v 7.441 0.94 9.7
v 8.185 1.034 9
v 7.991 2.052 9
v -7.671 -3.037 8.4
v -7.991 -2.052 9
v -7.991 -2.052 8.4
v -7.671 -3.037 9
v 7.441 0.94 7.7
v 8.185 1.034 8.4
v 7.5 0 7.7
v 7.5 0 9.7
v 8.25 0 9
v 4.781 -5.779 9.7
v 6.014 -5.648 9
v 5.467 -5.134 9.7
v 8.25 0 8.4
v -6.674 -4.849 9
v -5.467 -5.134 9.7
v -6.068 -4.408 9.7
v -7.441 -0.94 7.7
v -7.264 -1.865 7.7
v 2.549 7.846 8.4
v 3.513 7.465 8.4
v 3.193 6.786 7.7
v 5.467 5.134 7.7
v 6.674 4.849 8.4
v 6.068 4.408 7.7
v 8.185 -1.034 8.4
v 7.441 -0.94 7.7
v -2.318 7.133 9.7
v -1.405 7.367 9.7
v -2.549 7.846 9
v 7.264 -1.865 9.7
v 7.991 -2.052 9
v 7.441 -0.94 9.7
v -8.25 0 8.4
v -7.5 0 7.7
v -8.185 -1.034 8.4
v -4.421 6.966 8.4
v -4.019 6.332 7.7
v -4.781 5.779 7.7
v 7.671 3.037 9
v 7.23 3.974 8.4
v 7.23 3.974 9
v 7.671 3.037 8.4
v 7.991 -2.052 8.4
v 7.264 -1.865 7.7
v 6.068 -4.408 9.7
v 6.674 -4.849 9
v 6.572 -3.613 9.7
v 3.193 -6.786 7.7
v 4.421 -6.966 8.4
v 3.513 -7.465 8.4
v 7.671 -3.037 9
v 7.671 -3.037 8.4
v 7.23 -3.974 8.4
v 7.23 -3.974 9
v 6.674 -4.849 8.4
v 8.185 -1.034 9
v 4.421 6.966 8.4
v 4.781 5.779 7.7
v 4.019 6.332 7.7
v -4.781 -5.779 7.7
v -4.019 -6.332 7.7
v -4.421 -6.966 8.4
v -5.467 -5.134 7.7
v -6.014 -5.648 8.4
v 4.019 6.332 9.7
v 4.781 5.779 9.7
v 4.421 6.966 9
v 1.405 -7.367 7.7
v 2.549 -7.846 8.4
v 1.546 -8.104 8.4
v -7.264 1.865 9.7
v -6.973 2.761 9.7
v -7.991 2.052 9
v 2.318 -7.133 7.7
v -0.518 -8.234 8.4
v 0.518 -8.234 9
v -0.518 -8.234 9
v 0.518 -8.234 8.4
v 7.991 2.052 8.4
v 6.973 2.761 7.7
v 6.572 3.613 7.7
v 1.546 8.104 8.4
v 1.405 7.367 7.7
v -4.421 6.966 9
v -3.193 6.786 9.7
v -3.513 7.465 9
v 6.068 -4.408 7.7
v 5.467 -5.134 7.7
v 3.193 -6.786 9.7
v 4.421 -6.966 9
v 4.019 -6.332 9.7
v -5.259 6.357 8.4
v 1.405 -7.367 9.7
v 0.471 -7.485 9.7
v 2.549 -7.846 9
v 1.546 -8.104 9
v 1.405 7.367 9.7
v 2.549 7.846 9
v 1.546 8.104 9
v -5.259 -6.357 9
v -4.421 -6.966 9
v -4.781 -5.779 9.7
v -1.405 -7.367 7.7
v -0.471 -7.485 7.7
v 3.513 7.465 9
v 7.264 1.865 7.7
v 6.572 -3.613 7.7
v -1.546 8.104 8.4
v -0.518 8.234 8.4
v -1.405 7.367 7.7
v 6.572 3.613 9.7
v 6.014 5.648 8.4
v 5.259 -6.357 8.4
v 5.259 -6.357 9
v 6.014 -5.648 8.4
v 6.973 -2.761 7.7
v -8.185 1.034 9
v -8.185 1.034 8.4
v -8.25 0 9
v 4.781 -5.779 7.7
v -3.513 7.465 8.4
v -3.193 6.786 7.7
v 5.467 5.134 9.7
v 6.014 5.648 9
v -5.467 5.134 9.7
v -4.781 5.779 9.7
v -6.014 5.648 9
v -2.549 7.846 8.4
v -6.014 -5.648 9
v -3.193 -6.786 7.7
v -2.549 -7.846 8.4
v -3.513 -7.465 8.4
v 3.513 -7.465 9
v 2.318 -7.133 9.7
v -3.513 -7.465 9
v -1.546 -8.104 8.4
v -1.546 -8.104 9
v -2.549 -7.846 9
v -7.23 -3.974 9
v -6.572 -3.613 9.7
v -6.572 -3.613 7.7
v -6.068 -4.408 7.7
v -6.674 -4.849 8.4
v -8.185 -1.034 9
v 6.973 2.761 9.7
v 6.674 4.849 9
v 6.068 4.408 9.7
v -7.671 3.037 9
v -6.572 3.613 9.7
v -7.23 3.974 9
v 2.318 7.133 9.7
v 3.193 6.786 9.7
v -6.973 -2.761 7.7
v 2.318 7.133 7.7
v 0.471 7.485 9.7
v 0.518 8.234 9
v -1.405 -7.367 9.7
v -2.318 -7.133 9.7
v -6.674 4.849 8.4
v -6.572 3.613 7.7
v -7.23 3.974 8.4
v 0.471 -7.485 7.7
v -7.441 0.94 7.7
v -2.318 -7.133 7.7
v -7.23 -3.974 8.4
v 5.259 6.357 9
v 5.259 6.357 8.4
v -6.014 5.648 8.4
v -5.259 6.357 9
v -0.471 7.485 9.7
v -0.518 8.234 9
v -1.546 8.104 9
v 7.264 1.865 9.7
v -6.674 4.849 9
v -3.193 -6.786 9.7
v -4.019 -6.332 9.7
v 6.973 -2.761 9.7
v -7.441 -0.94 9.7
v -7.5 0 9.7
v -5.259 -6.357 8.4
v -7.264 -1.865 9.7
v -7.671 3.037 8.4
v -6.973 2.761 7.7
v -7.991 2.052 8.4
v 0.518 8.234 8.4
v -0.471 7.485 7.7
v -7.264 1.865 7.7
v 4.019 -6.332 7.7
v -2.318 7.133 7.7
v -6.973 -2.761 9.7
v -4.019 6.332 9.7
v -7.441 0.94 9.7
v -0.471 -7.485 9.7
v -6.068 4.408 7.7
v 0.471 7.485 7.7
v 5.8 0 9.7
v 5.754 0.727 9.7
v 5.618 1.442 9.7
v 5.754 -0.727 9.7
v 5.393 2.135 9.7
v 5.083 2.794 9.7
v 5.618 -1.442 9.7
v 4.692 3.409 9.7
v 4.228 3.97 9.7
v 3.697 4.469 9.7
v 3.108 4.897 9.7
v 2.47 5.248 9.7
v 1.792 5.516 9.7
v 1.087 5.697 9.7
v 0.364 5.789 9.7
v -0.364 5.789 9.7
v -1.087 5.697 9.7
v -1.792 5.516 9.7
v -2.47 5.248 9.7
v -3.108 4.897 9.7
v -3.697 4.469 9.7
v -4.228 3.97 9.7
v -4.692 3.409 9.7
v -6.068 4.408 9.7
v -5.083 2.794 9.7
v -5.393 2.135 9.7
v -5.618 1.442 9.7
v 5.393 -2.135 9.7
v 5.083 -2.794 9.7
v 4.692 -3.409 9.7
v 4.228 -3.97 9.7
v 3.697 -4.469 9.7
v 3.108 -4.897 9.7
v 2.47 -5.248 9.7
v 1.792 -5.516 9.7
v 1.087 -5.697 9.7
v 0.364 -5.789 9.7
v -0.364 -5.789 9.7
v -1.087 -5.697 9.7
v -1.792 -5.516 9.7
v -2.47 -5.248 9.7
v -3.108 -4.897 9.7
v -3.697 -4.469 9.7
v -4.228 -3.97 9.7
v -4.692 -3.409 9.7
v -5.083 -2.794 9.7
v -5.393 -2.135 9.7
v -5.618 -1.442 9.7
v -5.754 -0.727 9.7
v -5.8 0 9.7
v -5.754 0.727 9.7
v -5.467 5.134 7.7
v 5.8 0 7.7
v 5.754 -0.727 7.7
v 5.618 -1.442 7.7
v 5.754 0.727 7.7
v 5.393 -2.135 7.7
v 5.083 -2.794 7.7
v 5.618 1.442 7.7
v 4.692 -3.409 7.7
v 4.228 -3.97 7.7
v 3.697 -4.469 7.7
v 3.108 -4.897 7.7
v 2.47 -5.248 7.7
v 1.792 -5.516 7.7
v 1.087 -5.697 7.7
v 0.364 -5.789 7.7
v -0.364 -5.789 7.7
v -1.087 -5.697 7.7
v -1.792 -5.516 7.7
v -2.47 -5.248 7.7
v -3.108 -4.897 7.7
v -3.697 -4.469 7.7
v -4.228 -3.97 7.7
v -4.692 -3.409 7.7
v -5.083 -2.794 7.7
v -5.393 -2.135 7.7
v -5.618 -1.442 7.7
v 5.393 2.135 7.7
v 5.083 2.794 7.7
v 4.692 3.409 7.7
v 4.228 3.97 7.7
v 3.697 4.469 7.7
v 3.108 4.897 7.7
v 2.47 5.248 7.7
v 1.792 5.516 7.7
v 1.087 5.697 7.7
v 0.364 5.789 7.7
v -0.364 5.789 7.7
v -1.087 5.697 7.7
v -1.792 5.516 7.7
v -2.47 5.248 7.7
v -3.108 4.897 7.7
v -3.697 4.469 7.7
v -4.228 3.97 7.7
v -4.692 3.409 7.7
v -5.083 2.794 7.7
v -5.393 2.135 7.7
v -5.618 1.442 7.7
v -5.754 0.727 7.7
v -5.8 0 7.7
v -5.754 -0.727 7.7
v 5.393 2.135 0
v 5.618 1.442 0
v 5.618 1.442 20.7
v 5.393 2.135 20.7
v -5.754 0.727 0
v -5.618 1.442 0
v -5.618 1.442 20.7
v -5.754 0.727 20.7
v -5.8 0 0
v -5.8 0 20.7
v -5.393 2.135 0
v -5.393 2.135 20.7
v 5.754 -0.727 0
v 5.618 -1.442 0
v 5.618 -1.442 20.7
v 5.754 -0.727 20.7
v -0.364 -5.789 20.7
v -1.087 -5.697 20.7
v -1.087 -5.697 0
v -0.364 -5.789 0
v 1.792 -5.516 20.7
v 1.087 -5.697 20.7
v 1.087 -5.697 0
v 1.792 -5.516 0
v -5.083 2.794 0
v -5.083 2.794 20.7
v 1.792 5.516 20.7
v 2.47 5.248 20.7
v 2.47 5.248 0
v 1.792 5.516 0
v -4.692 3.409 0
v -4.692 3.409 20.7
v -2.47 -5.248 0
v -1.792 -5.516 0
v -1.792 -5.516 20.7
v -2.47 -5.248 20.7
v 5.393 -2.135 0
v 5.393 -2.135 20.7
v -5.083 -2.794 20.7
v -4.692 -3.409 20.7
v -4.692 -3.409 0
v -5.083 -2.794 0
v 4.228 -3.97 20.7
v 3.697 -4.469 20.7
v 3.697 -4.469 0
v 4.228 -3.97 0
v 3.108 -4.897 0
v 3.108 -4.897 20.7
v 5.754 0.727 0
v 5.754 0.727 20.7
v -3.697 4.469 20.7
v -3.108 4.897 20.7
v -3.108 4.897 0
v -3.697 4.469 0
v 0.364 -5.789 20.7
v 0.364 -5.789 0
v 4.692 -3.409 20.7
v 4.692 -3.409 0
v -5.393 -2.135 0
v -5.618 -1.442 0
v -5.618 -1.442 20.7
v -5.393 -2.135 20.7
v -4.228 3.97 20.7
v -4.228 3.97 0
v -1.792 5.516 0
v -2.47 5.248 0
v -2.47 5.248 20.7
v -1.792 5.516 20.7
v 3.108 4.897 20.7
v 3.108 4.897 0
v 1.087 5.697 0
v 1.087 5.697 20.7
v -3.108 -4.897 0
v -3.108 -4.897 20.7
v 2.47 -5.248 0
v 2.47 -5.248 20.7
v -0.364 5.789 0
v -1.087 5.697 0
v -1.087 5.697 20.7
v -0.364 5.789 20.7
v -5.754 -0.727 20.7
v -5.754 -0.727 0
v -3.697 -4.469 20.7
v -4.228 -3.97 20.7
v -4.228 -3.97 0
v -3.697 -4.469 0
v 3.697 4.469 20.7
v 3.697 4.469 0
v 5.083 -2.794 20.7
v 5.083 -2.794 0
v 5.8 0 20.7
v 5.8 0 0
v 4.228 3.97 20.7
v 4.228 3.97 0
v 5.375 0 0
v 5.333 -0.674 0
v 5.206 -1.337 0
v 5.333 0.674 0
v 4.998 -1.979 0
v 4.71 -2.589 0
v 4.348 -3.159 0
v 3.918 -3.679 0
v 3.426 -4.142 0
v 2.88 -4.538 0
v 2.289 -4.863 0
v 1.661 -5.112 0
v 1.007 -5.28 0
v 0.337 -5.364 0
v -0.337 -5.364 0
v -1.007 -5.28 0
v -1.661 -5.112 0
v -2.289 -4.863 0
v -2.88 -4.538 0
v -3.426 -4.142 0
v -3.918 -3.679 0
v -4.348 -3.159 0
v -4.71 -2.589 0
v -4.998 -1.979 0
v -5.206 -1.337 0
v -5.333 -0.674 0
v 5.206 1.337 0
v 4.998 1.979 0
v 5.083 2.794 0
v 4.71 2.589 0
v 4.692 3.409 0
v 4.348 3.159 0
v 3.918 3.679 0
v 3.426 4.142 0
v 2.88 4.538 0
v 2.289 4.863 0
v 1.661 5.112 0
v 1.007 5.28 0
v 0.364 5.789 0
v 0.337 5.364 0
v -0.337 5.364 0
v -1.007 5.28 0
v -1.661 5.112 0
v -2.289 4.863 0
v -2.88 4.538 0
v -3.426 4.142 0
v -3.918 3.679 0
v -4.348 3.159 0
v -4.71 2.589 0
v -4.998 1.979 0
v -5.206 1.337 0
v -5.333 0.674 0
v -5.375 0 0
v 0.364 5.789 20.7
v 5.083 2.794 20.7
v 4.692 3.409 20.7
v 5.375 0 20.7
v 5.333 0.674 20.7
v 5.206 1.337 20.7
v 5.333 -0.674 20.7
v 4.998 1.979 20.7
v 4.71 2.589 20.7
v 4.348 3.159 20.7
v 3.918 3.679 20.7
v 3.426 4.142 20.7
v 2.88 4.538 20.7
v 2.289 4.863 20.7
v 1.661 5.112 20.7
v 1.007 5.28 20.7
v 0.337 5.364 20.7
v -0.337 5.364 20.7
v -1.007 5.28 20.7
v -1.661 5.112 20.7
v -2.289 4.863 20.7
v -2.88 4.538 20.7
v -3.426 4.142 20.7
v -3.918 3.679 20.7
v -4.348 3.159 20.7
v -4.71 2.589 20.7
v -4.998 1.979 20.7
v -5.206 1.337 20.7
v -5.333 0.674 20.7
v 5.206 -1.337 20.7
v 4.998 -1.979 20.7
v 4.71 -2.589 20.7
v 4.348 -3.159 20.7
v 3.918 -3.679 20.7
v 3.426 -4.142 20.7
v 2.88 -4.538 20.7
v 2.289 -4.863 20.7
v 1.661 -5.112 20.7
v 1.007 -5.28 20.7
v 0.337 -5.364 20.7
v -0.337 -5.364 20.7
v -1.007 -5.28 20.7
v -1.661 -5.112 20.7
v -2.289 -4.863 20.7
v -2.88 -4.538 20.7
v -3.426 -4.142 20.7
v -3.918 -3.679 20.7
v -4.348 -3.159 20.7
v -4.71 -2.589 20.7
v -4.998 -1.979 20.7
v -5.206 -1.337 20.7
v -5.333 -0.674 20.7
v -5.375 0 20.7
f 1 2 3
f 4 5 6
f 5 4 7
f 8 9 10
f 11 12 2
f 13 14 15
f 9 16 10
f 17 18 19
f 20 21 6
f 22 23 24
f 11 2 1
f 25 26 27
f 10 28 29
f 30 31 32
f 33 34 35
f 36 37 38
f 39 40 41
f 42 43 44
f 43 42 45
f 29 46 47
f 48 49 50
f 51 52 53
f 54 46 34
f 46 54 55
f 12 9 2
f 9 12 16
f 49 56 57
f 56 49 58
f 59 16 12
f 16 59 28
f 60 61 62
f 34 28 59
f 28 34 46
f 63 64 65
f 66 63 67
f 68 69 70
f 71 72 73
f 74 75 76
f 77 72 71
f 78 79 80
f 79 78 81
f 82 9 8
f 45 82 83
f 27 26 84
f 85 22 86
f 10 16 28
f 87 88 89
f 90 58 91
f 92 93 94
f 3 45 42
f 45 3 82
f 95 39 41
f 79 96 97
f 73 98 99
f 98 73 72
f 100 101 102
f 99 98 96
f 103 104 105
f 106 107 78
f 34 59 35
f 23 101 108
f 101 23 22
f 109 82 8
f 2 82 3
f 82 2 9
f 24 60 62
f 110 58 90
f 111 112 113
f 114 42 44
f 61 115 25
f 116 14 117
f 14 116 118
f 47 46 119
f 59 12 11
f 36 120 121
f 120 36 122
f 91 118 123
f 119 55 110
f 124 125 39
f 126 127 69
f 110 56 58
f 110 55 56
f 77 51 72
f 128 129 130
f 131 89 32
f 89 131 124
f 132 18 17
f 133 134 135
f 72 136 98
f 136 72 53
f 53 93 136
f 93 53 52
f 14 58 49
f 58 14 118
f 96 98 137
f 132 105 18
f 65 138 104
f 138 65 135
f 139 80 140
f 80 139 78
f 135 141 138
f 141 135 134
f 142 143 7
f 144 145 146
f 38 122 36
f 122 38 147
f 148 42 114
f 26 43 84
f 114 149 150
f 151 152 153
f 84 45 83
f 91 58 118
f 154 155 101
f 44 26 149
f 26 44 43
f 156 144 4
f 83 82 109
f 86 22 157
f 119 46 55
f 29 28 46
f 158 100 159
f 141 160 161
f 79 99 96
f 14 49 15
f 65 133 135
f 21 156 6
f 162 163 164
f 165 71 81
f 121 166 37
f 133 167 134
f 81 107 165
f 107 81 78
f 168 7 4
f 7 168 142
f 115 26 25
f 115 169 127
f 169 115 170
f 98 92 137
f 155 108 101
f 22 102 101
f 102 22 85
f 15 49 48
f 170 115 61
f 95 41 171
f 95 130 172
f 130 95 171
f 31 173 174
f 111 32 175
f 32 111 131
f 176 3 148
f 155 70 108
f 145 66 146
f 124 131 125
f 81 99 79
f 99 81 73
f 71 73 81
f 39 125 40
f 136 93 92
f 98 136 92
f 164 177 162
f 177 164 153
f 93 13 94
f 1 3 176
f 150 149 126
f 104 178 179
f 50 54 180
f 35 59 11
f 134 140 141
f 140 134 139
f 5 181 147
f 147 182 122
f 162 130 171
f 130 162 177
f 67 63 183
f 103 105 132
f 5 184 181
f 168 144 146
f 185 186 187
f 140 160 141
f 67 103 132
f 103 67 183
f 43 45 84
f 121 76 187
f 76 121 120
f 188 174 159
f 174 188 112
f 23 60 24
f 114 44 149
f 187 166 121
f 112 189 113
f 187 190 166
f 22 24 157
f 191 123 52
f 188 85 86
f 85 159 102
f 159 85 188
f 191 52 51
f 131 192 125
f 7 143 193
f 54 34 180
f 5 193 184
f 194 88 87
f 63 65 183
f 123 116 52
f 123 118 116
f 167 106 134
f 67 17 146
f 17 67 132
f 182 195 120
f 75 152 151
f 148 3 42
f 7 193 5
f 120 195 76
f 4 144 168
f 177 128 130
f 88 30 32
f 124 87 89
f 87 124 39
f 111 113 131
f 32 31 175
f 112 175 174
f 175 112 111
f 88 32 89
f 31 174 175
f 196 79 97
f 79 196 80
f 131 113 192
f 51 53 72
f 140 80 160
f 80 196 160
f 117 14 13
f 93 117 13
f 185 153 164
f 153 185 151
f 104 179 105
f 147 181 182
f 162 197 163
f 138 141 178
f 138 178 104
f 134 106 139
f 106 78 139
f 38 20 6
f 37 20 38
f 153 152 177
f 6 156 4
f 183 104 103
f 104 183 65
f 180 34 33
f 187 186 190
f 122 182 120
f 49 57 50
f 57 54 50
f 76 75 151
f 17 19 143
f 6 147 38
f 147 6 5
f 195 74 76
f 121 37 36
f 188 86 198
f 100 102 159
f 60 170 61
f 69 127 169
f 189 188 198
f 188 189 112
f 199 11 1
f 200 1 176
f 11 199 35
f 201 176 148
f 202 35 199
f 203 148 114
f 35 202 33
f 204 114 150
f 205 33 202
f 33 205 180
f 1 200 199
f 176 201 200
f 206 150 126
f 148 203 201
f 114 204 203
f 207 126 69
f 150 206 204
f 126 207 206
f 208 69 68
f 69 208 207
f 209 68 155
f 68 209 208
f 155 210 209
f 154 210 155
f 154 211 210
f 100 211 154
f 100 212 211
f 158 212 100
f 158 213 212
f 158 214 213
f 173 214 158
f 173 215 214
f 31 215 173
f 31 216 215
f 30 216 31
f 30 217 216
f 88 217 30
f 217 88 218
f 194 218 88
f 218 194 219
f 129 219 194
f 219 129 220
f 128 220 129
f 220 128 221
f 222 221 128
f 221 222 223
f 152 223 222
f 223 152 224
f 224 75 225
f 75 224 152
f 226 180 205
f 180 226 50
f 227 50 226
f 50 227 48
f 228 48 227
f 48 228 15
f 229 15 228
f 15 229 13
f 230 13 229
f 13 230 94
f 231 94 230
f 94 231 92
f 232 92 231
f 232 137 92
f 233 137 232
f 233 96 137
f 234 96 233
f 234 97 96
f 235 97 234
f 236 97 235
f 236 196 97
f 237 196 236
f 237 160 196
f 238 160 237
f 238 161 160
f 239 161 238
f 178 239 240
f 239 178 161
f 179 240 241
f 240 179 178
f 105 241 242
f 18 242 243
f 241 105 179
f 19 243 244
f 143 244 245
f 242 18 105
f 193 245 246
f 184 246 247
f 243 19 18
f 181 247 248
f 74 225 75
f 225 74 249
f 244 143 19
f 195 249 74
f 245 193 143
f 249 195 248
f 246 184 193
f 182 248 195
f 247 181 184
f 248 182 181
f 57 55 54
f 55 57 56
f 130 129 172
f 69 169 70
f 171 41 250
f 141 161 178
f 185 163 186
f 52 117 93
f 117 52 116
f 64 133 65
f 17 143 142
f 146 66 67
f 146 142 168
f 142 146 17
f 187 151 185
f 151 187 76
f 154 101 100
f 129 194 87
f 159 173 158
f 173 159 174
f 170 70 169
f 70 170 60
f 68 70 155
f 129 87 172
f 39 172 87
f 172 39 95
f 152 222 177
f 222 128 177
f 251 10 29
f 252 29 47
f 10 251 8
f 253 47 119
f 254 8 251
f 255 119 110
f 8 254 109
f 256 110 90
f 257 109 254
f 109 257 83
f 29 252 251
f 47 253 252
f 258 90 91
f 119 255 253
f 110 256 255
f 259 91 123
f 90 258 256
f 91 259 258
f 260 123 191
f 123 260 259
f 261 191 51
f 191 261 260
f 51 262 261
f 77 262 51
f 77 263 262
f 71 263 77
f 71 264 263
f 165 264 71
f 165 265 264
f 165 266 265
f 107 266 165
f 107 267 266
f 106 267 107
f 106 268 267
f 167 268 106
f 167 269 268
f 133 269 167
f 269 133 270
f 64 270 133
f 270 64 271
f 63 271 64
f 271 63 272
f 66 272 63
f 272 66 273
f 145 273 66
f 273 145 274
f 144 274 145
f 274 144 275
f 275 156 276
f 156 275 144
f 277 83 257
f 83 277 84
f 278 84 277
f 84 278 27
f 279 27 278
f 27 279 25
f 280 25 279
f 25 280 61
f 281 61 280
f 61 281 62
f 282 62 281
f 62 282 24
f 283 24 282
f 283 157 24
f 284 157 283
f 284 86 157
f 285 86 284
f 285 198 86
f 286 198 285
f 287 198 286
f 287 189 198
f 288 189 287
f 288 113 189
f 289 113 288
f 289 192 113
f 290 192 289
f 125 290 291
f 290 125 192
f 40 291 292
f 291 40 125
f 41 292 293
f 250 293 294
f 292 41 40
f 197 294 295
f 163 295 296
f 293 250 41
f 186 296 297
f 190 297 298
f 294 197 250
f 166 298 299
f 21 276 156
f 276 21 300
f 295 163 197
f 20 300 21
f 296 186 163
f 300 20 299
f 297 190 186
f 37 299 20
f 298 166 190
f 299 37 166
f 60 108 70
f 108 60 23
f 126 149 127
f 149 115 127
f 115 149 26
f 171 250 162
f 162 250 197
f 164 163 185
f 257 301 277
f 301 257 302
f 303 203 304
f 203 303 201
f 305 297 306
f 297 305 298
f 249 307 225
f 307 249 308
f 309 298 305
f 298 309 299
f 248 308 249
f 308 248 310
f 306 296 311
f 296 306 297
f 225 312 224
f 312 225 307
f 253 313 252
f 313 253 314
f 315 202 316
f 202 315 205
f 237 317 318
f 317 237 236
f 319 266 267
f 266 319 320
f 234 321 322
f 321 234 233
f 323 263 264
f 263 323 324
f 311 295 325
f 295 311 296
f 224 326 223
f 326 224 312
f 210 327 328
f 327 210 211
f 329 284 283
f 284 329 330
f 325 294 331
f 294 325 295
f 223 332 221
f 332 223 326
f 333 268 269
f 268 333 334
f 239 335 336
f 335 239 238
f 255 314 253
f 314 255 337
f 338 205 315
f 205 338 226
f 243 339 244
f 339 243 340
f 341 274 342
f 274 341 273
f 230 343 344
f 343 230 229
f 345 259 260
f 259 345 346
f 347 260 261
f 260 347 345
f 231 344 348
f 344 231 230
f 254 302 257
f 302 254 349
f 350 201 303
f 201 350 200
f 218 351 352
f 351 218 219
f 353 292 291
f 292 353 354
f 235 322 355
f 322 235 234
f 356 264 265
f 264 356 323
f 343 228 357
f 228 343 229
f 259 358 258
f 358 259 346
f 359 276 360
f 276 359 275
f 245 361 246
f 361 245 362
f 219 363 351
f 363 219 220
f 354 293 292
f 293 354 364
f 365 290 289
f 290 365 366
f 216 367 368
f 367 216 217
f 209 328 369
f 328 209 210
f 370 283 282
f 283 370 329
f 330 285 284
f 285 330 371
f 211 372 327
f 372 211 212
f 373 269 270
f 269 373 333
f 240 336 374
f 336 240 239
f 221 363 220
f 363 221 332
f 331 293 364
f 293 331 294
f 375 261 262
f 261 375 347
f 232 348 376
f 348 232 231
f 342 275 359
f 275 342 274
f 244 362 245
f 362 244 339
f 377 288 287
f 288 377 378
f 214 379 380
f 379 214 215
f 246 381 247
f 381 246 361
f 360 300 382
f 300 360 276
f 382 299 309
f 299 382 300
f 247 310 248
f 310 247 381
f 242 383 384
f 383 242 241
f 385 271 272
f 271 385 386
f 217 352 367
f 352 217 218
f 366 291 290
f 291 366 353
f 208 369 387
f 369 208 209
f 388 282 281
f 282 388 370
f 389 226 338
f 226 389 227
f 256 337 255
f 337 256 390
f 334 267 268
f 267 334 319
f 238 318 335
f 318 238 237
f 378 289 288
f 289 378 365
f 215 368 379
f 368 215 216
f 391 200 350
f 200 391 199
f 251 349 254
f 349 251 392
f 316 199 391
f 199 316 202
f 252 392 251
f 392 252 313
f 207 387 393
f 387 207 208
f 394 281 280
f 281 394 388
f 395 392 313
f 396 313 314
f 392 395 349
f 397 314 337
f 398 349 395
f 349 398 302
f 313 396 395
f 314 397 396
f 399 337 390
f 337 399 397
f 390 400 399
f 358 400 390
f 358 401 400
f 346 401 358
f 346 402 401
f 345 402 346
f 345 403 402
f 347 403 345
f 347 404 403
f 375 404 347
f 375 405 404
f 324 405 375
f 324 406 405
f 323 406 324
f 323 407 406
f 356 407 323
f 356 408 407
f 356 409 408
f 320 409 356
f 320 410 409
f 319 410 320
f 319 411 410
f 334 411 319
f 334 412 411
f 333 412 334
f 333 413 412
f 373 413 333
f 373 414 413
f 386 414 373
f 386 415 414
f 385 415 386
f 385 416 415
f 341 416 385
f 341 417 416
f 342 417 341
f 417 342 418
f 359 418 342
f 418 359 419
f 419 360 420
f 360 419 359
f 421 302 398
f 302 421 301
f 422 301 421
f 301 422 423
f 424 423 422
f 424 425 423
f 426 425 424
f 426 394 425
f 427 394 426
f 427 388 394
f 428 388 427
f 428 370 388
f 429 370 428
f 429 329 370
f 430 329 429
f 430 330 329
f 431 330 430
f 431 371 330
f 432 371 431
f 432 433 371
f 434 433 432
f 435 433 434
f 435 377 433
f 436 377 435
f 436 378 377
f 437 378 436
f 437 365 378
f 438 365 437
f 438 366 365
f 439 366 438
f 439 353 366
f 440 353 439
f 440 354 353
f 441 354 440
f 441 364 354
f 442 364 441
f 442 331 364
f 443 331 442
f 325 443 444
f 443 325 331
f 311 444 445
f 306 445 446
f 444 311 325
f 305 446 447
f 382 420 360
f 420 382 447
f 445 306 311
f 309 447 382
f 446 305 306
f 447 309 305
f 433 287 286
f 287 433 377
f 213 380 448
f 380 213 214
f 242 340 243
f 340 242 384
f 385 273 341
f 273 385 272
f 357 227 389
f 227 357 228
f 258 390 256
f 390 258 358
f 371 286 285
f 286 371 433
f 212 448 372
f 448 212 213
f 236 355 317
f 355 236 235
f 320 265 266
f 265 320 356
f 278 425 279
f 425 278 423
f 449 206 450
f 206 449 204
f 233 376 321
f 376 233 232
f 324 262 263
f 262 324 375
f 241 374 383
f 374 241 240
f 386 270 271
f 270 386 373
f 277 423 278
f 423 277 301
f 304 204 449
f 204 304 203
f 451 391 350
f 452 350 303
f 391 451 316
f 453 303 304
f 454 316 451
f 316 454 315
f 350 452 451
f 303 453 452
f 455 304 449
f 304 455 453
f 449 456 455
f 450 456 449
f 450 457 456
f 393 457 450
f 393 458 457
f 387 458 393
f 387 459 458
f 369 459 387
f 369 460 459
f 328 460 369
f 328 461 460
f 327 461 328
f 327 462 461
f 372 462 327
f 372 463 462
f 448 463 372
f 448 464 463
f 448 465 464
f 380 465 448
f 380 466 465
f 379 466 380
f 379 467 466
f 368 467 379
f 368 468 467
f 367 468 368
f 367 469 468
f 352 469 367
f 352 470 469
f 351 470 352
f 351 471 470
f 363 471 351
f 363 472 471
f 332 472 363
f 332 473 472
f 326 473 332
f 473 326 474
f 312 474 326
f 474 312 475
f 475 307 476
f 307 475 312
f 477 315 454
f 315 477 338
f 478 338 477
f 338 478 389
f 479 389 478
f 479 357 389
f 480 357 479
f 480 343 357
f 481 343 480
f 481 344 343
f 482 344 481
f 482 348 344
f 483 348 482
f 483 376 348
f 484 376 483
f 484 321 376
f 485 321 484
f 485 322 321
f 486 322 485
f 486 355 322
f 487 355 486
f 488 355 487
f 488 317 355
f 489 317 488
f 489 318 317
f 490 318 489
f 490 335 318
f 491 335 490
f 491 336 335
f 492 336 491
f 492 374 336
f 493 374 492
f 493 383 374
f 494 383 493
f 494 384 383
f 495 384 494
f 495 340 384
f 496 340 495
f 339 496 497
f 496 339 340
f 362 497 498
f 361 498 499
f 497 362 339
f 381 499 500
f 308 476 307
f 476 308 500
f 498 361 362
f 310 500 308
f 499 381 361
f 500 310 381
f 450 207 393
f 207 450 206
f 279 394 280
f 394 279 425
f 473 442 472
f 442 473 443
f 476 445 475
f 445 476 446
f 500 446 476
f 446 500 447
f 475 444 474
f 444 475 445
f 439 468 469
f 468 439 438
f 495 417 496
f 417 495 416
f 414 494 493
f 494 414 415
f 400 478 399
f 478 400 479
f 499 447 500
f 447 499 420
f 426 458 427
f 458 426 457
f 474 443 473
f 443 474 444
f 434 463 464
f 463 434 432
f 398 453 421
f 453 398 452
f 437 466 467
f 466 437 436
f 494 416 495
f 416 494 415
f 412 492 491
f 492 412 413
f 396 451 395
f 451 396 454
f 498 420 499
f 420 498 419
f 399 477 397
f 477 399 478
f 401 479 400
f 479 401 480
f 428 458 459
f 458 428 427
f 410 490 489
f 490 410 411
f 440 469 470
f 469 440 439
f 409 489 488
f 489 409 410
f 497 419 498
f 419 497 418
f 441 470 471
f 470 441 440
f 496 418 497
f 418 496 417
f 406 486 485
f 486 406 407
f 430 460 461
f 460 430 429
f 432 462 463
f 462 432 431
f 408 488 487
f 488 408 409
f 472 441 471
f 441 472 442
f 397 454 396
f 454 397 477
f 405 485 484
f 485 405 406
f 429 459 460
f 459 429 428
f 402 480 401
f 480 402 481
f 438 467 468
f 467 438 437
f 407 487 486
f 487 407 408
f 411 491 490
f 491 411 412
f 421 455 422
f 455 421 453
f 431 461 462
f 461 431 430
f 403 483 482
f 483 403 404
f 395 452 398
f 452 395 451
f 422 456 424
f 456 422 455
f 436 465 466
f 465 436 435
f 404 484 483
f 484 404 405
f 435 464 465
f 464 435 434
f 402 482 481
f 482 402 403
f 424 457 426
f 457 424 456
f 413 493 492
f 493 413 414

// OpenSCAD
// plotter pen adapter for Sharpie Fine Point markers
// created January, 2014 by Brian Boucheron <brian@boucheron.org>

band_full_thickness = 2;    // thickest point of the band
band_edge_thickness = 0.6;  // thinnest point of the band
band_full_diameter = 16.5;  // diameter at widest point of band
band_edge_diameter = 15;    // diameter where band starts to angle in


// sharpie outer diameter measured at 10.64mm
// plotter outer diameter measured at 11.50mm
body_outer_diameter = 11.6; // outer diameter of the main body
body_inner_diameter = 10.75; // inner diameter of the main body

profile = [
    [0,0],
    [band_edge_diameter / 2, 0],
    [band_full_diameter / 2, (band_full_thickness - band_edge_thickness) / 2],
    [band_full_diameter / 2, band_full_thickness - ((band_full_thickness - band_edge_thickness) / 2)],
    [band_edge_diameter / 2, band_full_thickness],
    [0,band_full_thickness],
    // end body
];

translate([0,0,37])
rotate(a=[0,180,0]){

    difference() {

        union() {
            translate([0,0,27.3])
            rotate_extrude($fn=50)
            polygon(points=profile);
            translate([0,0,27.3-11])
            cylinder(r=body_outer_diameter/2, h=20.7, $fn=50);
        }

        cylinder(r=body_inner_diameter/2, h=50, $fn=50);

    }
}
